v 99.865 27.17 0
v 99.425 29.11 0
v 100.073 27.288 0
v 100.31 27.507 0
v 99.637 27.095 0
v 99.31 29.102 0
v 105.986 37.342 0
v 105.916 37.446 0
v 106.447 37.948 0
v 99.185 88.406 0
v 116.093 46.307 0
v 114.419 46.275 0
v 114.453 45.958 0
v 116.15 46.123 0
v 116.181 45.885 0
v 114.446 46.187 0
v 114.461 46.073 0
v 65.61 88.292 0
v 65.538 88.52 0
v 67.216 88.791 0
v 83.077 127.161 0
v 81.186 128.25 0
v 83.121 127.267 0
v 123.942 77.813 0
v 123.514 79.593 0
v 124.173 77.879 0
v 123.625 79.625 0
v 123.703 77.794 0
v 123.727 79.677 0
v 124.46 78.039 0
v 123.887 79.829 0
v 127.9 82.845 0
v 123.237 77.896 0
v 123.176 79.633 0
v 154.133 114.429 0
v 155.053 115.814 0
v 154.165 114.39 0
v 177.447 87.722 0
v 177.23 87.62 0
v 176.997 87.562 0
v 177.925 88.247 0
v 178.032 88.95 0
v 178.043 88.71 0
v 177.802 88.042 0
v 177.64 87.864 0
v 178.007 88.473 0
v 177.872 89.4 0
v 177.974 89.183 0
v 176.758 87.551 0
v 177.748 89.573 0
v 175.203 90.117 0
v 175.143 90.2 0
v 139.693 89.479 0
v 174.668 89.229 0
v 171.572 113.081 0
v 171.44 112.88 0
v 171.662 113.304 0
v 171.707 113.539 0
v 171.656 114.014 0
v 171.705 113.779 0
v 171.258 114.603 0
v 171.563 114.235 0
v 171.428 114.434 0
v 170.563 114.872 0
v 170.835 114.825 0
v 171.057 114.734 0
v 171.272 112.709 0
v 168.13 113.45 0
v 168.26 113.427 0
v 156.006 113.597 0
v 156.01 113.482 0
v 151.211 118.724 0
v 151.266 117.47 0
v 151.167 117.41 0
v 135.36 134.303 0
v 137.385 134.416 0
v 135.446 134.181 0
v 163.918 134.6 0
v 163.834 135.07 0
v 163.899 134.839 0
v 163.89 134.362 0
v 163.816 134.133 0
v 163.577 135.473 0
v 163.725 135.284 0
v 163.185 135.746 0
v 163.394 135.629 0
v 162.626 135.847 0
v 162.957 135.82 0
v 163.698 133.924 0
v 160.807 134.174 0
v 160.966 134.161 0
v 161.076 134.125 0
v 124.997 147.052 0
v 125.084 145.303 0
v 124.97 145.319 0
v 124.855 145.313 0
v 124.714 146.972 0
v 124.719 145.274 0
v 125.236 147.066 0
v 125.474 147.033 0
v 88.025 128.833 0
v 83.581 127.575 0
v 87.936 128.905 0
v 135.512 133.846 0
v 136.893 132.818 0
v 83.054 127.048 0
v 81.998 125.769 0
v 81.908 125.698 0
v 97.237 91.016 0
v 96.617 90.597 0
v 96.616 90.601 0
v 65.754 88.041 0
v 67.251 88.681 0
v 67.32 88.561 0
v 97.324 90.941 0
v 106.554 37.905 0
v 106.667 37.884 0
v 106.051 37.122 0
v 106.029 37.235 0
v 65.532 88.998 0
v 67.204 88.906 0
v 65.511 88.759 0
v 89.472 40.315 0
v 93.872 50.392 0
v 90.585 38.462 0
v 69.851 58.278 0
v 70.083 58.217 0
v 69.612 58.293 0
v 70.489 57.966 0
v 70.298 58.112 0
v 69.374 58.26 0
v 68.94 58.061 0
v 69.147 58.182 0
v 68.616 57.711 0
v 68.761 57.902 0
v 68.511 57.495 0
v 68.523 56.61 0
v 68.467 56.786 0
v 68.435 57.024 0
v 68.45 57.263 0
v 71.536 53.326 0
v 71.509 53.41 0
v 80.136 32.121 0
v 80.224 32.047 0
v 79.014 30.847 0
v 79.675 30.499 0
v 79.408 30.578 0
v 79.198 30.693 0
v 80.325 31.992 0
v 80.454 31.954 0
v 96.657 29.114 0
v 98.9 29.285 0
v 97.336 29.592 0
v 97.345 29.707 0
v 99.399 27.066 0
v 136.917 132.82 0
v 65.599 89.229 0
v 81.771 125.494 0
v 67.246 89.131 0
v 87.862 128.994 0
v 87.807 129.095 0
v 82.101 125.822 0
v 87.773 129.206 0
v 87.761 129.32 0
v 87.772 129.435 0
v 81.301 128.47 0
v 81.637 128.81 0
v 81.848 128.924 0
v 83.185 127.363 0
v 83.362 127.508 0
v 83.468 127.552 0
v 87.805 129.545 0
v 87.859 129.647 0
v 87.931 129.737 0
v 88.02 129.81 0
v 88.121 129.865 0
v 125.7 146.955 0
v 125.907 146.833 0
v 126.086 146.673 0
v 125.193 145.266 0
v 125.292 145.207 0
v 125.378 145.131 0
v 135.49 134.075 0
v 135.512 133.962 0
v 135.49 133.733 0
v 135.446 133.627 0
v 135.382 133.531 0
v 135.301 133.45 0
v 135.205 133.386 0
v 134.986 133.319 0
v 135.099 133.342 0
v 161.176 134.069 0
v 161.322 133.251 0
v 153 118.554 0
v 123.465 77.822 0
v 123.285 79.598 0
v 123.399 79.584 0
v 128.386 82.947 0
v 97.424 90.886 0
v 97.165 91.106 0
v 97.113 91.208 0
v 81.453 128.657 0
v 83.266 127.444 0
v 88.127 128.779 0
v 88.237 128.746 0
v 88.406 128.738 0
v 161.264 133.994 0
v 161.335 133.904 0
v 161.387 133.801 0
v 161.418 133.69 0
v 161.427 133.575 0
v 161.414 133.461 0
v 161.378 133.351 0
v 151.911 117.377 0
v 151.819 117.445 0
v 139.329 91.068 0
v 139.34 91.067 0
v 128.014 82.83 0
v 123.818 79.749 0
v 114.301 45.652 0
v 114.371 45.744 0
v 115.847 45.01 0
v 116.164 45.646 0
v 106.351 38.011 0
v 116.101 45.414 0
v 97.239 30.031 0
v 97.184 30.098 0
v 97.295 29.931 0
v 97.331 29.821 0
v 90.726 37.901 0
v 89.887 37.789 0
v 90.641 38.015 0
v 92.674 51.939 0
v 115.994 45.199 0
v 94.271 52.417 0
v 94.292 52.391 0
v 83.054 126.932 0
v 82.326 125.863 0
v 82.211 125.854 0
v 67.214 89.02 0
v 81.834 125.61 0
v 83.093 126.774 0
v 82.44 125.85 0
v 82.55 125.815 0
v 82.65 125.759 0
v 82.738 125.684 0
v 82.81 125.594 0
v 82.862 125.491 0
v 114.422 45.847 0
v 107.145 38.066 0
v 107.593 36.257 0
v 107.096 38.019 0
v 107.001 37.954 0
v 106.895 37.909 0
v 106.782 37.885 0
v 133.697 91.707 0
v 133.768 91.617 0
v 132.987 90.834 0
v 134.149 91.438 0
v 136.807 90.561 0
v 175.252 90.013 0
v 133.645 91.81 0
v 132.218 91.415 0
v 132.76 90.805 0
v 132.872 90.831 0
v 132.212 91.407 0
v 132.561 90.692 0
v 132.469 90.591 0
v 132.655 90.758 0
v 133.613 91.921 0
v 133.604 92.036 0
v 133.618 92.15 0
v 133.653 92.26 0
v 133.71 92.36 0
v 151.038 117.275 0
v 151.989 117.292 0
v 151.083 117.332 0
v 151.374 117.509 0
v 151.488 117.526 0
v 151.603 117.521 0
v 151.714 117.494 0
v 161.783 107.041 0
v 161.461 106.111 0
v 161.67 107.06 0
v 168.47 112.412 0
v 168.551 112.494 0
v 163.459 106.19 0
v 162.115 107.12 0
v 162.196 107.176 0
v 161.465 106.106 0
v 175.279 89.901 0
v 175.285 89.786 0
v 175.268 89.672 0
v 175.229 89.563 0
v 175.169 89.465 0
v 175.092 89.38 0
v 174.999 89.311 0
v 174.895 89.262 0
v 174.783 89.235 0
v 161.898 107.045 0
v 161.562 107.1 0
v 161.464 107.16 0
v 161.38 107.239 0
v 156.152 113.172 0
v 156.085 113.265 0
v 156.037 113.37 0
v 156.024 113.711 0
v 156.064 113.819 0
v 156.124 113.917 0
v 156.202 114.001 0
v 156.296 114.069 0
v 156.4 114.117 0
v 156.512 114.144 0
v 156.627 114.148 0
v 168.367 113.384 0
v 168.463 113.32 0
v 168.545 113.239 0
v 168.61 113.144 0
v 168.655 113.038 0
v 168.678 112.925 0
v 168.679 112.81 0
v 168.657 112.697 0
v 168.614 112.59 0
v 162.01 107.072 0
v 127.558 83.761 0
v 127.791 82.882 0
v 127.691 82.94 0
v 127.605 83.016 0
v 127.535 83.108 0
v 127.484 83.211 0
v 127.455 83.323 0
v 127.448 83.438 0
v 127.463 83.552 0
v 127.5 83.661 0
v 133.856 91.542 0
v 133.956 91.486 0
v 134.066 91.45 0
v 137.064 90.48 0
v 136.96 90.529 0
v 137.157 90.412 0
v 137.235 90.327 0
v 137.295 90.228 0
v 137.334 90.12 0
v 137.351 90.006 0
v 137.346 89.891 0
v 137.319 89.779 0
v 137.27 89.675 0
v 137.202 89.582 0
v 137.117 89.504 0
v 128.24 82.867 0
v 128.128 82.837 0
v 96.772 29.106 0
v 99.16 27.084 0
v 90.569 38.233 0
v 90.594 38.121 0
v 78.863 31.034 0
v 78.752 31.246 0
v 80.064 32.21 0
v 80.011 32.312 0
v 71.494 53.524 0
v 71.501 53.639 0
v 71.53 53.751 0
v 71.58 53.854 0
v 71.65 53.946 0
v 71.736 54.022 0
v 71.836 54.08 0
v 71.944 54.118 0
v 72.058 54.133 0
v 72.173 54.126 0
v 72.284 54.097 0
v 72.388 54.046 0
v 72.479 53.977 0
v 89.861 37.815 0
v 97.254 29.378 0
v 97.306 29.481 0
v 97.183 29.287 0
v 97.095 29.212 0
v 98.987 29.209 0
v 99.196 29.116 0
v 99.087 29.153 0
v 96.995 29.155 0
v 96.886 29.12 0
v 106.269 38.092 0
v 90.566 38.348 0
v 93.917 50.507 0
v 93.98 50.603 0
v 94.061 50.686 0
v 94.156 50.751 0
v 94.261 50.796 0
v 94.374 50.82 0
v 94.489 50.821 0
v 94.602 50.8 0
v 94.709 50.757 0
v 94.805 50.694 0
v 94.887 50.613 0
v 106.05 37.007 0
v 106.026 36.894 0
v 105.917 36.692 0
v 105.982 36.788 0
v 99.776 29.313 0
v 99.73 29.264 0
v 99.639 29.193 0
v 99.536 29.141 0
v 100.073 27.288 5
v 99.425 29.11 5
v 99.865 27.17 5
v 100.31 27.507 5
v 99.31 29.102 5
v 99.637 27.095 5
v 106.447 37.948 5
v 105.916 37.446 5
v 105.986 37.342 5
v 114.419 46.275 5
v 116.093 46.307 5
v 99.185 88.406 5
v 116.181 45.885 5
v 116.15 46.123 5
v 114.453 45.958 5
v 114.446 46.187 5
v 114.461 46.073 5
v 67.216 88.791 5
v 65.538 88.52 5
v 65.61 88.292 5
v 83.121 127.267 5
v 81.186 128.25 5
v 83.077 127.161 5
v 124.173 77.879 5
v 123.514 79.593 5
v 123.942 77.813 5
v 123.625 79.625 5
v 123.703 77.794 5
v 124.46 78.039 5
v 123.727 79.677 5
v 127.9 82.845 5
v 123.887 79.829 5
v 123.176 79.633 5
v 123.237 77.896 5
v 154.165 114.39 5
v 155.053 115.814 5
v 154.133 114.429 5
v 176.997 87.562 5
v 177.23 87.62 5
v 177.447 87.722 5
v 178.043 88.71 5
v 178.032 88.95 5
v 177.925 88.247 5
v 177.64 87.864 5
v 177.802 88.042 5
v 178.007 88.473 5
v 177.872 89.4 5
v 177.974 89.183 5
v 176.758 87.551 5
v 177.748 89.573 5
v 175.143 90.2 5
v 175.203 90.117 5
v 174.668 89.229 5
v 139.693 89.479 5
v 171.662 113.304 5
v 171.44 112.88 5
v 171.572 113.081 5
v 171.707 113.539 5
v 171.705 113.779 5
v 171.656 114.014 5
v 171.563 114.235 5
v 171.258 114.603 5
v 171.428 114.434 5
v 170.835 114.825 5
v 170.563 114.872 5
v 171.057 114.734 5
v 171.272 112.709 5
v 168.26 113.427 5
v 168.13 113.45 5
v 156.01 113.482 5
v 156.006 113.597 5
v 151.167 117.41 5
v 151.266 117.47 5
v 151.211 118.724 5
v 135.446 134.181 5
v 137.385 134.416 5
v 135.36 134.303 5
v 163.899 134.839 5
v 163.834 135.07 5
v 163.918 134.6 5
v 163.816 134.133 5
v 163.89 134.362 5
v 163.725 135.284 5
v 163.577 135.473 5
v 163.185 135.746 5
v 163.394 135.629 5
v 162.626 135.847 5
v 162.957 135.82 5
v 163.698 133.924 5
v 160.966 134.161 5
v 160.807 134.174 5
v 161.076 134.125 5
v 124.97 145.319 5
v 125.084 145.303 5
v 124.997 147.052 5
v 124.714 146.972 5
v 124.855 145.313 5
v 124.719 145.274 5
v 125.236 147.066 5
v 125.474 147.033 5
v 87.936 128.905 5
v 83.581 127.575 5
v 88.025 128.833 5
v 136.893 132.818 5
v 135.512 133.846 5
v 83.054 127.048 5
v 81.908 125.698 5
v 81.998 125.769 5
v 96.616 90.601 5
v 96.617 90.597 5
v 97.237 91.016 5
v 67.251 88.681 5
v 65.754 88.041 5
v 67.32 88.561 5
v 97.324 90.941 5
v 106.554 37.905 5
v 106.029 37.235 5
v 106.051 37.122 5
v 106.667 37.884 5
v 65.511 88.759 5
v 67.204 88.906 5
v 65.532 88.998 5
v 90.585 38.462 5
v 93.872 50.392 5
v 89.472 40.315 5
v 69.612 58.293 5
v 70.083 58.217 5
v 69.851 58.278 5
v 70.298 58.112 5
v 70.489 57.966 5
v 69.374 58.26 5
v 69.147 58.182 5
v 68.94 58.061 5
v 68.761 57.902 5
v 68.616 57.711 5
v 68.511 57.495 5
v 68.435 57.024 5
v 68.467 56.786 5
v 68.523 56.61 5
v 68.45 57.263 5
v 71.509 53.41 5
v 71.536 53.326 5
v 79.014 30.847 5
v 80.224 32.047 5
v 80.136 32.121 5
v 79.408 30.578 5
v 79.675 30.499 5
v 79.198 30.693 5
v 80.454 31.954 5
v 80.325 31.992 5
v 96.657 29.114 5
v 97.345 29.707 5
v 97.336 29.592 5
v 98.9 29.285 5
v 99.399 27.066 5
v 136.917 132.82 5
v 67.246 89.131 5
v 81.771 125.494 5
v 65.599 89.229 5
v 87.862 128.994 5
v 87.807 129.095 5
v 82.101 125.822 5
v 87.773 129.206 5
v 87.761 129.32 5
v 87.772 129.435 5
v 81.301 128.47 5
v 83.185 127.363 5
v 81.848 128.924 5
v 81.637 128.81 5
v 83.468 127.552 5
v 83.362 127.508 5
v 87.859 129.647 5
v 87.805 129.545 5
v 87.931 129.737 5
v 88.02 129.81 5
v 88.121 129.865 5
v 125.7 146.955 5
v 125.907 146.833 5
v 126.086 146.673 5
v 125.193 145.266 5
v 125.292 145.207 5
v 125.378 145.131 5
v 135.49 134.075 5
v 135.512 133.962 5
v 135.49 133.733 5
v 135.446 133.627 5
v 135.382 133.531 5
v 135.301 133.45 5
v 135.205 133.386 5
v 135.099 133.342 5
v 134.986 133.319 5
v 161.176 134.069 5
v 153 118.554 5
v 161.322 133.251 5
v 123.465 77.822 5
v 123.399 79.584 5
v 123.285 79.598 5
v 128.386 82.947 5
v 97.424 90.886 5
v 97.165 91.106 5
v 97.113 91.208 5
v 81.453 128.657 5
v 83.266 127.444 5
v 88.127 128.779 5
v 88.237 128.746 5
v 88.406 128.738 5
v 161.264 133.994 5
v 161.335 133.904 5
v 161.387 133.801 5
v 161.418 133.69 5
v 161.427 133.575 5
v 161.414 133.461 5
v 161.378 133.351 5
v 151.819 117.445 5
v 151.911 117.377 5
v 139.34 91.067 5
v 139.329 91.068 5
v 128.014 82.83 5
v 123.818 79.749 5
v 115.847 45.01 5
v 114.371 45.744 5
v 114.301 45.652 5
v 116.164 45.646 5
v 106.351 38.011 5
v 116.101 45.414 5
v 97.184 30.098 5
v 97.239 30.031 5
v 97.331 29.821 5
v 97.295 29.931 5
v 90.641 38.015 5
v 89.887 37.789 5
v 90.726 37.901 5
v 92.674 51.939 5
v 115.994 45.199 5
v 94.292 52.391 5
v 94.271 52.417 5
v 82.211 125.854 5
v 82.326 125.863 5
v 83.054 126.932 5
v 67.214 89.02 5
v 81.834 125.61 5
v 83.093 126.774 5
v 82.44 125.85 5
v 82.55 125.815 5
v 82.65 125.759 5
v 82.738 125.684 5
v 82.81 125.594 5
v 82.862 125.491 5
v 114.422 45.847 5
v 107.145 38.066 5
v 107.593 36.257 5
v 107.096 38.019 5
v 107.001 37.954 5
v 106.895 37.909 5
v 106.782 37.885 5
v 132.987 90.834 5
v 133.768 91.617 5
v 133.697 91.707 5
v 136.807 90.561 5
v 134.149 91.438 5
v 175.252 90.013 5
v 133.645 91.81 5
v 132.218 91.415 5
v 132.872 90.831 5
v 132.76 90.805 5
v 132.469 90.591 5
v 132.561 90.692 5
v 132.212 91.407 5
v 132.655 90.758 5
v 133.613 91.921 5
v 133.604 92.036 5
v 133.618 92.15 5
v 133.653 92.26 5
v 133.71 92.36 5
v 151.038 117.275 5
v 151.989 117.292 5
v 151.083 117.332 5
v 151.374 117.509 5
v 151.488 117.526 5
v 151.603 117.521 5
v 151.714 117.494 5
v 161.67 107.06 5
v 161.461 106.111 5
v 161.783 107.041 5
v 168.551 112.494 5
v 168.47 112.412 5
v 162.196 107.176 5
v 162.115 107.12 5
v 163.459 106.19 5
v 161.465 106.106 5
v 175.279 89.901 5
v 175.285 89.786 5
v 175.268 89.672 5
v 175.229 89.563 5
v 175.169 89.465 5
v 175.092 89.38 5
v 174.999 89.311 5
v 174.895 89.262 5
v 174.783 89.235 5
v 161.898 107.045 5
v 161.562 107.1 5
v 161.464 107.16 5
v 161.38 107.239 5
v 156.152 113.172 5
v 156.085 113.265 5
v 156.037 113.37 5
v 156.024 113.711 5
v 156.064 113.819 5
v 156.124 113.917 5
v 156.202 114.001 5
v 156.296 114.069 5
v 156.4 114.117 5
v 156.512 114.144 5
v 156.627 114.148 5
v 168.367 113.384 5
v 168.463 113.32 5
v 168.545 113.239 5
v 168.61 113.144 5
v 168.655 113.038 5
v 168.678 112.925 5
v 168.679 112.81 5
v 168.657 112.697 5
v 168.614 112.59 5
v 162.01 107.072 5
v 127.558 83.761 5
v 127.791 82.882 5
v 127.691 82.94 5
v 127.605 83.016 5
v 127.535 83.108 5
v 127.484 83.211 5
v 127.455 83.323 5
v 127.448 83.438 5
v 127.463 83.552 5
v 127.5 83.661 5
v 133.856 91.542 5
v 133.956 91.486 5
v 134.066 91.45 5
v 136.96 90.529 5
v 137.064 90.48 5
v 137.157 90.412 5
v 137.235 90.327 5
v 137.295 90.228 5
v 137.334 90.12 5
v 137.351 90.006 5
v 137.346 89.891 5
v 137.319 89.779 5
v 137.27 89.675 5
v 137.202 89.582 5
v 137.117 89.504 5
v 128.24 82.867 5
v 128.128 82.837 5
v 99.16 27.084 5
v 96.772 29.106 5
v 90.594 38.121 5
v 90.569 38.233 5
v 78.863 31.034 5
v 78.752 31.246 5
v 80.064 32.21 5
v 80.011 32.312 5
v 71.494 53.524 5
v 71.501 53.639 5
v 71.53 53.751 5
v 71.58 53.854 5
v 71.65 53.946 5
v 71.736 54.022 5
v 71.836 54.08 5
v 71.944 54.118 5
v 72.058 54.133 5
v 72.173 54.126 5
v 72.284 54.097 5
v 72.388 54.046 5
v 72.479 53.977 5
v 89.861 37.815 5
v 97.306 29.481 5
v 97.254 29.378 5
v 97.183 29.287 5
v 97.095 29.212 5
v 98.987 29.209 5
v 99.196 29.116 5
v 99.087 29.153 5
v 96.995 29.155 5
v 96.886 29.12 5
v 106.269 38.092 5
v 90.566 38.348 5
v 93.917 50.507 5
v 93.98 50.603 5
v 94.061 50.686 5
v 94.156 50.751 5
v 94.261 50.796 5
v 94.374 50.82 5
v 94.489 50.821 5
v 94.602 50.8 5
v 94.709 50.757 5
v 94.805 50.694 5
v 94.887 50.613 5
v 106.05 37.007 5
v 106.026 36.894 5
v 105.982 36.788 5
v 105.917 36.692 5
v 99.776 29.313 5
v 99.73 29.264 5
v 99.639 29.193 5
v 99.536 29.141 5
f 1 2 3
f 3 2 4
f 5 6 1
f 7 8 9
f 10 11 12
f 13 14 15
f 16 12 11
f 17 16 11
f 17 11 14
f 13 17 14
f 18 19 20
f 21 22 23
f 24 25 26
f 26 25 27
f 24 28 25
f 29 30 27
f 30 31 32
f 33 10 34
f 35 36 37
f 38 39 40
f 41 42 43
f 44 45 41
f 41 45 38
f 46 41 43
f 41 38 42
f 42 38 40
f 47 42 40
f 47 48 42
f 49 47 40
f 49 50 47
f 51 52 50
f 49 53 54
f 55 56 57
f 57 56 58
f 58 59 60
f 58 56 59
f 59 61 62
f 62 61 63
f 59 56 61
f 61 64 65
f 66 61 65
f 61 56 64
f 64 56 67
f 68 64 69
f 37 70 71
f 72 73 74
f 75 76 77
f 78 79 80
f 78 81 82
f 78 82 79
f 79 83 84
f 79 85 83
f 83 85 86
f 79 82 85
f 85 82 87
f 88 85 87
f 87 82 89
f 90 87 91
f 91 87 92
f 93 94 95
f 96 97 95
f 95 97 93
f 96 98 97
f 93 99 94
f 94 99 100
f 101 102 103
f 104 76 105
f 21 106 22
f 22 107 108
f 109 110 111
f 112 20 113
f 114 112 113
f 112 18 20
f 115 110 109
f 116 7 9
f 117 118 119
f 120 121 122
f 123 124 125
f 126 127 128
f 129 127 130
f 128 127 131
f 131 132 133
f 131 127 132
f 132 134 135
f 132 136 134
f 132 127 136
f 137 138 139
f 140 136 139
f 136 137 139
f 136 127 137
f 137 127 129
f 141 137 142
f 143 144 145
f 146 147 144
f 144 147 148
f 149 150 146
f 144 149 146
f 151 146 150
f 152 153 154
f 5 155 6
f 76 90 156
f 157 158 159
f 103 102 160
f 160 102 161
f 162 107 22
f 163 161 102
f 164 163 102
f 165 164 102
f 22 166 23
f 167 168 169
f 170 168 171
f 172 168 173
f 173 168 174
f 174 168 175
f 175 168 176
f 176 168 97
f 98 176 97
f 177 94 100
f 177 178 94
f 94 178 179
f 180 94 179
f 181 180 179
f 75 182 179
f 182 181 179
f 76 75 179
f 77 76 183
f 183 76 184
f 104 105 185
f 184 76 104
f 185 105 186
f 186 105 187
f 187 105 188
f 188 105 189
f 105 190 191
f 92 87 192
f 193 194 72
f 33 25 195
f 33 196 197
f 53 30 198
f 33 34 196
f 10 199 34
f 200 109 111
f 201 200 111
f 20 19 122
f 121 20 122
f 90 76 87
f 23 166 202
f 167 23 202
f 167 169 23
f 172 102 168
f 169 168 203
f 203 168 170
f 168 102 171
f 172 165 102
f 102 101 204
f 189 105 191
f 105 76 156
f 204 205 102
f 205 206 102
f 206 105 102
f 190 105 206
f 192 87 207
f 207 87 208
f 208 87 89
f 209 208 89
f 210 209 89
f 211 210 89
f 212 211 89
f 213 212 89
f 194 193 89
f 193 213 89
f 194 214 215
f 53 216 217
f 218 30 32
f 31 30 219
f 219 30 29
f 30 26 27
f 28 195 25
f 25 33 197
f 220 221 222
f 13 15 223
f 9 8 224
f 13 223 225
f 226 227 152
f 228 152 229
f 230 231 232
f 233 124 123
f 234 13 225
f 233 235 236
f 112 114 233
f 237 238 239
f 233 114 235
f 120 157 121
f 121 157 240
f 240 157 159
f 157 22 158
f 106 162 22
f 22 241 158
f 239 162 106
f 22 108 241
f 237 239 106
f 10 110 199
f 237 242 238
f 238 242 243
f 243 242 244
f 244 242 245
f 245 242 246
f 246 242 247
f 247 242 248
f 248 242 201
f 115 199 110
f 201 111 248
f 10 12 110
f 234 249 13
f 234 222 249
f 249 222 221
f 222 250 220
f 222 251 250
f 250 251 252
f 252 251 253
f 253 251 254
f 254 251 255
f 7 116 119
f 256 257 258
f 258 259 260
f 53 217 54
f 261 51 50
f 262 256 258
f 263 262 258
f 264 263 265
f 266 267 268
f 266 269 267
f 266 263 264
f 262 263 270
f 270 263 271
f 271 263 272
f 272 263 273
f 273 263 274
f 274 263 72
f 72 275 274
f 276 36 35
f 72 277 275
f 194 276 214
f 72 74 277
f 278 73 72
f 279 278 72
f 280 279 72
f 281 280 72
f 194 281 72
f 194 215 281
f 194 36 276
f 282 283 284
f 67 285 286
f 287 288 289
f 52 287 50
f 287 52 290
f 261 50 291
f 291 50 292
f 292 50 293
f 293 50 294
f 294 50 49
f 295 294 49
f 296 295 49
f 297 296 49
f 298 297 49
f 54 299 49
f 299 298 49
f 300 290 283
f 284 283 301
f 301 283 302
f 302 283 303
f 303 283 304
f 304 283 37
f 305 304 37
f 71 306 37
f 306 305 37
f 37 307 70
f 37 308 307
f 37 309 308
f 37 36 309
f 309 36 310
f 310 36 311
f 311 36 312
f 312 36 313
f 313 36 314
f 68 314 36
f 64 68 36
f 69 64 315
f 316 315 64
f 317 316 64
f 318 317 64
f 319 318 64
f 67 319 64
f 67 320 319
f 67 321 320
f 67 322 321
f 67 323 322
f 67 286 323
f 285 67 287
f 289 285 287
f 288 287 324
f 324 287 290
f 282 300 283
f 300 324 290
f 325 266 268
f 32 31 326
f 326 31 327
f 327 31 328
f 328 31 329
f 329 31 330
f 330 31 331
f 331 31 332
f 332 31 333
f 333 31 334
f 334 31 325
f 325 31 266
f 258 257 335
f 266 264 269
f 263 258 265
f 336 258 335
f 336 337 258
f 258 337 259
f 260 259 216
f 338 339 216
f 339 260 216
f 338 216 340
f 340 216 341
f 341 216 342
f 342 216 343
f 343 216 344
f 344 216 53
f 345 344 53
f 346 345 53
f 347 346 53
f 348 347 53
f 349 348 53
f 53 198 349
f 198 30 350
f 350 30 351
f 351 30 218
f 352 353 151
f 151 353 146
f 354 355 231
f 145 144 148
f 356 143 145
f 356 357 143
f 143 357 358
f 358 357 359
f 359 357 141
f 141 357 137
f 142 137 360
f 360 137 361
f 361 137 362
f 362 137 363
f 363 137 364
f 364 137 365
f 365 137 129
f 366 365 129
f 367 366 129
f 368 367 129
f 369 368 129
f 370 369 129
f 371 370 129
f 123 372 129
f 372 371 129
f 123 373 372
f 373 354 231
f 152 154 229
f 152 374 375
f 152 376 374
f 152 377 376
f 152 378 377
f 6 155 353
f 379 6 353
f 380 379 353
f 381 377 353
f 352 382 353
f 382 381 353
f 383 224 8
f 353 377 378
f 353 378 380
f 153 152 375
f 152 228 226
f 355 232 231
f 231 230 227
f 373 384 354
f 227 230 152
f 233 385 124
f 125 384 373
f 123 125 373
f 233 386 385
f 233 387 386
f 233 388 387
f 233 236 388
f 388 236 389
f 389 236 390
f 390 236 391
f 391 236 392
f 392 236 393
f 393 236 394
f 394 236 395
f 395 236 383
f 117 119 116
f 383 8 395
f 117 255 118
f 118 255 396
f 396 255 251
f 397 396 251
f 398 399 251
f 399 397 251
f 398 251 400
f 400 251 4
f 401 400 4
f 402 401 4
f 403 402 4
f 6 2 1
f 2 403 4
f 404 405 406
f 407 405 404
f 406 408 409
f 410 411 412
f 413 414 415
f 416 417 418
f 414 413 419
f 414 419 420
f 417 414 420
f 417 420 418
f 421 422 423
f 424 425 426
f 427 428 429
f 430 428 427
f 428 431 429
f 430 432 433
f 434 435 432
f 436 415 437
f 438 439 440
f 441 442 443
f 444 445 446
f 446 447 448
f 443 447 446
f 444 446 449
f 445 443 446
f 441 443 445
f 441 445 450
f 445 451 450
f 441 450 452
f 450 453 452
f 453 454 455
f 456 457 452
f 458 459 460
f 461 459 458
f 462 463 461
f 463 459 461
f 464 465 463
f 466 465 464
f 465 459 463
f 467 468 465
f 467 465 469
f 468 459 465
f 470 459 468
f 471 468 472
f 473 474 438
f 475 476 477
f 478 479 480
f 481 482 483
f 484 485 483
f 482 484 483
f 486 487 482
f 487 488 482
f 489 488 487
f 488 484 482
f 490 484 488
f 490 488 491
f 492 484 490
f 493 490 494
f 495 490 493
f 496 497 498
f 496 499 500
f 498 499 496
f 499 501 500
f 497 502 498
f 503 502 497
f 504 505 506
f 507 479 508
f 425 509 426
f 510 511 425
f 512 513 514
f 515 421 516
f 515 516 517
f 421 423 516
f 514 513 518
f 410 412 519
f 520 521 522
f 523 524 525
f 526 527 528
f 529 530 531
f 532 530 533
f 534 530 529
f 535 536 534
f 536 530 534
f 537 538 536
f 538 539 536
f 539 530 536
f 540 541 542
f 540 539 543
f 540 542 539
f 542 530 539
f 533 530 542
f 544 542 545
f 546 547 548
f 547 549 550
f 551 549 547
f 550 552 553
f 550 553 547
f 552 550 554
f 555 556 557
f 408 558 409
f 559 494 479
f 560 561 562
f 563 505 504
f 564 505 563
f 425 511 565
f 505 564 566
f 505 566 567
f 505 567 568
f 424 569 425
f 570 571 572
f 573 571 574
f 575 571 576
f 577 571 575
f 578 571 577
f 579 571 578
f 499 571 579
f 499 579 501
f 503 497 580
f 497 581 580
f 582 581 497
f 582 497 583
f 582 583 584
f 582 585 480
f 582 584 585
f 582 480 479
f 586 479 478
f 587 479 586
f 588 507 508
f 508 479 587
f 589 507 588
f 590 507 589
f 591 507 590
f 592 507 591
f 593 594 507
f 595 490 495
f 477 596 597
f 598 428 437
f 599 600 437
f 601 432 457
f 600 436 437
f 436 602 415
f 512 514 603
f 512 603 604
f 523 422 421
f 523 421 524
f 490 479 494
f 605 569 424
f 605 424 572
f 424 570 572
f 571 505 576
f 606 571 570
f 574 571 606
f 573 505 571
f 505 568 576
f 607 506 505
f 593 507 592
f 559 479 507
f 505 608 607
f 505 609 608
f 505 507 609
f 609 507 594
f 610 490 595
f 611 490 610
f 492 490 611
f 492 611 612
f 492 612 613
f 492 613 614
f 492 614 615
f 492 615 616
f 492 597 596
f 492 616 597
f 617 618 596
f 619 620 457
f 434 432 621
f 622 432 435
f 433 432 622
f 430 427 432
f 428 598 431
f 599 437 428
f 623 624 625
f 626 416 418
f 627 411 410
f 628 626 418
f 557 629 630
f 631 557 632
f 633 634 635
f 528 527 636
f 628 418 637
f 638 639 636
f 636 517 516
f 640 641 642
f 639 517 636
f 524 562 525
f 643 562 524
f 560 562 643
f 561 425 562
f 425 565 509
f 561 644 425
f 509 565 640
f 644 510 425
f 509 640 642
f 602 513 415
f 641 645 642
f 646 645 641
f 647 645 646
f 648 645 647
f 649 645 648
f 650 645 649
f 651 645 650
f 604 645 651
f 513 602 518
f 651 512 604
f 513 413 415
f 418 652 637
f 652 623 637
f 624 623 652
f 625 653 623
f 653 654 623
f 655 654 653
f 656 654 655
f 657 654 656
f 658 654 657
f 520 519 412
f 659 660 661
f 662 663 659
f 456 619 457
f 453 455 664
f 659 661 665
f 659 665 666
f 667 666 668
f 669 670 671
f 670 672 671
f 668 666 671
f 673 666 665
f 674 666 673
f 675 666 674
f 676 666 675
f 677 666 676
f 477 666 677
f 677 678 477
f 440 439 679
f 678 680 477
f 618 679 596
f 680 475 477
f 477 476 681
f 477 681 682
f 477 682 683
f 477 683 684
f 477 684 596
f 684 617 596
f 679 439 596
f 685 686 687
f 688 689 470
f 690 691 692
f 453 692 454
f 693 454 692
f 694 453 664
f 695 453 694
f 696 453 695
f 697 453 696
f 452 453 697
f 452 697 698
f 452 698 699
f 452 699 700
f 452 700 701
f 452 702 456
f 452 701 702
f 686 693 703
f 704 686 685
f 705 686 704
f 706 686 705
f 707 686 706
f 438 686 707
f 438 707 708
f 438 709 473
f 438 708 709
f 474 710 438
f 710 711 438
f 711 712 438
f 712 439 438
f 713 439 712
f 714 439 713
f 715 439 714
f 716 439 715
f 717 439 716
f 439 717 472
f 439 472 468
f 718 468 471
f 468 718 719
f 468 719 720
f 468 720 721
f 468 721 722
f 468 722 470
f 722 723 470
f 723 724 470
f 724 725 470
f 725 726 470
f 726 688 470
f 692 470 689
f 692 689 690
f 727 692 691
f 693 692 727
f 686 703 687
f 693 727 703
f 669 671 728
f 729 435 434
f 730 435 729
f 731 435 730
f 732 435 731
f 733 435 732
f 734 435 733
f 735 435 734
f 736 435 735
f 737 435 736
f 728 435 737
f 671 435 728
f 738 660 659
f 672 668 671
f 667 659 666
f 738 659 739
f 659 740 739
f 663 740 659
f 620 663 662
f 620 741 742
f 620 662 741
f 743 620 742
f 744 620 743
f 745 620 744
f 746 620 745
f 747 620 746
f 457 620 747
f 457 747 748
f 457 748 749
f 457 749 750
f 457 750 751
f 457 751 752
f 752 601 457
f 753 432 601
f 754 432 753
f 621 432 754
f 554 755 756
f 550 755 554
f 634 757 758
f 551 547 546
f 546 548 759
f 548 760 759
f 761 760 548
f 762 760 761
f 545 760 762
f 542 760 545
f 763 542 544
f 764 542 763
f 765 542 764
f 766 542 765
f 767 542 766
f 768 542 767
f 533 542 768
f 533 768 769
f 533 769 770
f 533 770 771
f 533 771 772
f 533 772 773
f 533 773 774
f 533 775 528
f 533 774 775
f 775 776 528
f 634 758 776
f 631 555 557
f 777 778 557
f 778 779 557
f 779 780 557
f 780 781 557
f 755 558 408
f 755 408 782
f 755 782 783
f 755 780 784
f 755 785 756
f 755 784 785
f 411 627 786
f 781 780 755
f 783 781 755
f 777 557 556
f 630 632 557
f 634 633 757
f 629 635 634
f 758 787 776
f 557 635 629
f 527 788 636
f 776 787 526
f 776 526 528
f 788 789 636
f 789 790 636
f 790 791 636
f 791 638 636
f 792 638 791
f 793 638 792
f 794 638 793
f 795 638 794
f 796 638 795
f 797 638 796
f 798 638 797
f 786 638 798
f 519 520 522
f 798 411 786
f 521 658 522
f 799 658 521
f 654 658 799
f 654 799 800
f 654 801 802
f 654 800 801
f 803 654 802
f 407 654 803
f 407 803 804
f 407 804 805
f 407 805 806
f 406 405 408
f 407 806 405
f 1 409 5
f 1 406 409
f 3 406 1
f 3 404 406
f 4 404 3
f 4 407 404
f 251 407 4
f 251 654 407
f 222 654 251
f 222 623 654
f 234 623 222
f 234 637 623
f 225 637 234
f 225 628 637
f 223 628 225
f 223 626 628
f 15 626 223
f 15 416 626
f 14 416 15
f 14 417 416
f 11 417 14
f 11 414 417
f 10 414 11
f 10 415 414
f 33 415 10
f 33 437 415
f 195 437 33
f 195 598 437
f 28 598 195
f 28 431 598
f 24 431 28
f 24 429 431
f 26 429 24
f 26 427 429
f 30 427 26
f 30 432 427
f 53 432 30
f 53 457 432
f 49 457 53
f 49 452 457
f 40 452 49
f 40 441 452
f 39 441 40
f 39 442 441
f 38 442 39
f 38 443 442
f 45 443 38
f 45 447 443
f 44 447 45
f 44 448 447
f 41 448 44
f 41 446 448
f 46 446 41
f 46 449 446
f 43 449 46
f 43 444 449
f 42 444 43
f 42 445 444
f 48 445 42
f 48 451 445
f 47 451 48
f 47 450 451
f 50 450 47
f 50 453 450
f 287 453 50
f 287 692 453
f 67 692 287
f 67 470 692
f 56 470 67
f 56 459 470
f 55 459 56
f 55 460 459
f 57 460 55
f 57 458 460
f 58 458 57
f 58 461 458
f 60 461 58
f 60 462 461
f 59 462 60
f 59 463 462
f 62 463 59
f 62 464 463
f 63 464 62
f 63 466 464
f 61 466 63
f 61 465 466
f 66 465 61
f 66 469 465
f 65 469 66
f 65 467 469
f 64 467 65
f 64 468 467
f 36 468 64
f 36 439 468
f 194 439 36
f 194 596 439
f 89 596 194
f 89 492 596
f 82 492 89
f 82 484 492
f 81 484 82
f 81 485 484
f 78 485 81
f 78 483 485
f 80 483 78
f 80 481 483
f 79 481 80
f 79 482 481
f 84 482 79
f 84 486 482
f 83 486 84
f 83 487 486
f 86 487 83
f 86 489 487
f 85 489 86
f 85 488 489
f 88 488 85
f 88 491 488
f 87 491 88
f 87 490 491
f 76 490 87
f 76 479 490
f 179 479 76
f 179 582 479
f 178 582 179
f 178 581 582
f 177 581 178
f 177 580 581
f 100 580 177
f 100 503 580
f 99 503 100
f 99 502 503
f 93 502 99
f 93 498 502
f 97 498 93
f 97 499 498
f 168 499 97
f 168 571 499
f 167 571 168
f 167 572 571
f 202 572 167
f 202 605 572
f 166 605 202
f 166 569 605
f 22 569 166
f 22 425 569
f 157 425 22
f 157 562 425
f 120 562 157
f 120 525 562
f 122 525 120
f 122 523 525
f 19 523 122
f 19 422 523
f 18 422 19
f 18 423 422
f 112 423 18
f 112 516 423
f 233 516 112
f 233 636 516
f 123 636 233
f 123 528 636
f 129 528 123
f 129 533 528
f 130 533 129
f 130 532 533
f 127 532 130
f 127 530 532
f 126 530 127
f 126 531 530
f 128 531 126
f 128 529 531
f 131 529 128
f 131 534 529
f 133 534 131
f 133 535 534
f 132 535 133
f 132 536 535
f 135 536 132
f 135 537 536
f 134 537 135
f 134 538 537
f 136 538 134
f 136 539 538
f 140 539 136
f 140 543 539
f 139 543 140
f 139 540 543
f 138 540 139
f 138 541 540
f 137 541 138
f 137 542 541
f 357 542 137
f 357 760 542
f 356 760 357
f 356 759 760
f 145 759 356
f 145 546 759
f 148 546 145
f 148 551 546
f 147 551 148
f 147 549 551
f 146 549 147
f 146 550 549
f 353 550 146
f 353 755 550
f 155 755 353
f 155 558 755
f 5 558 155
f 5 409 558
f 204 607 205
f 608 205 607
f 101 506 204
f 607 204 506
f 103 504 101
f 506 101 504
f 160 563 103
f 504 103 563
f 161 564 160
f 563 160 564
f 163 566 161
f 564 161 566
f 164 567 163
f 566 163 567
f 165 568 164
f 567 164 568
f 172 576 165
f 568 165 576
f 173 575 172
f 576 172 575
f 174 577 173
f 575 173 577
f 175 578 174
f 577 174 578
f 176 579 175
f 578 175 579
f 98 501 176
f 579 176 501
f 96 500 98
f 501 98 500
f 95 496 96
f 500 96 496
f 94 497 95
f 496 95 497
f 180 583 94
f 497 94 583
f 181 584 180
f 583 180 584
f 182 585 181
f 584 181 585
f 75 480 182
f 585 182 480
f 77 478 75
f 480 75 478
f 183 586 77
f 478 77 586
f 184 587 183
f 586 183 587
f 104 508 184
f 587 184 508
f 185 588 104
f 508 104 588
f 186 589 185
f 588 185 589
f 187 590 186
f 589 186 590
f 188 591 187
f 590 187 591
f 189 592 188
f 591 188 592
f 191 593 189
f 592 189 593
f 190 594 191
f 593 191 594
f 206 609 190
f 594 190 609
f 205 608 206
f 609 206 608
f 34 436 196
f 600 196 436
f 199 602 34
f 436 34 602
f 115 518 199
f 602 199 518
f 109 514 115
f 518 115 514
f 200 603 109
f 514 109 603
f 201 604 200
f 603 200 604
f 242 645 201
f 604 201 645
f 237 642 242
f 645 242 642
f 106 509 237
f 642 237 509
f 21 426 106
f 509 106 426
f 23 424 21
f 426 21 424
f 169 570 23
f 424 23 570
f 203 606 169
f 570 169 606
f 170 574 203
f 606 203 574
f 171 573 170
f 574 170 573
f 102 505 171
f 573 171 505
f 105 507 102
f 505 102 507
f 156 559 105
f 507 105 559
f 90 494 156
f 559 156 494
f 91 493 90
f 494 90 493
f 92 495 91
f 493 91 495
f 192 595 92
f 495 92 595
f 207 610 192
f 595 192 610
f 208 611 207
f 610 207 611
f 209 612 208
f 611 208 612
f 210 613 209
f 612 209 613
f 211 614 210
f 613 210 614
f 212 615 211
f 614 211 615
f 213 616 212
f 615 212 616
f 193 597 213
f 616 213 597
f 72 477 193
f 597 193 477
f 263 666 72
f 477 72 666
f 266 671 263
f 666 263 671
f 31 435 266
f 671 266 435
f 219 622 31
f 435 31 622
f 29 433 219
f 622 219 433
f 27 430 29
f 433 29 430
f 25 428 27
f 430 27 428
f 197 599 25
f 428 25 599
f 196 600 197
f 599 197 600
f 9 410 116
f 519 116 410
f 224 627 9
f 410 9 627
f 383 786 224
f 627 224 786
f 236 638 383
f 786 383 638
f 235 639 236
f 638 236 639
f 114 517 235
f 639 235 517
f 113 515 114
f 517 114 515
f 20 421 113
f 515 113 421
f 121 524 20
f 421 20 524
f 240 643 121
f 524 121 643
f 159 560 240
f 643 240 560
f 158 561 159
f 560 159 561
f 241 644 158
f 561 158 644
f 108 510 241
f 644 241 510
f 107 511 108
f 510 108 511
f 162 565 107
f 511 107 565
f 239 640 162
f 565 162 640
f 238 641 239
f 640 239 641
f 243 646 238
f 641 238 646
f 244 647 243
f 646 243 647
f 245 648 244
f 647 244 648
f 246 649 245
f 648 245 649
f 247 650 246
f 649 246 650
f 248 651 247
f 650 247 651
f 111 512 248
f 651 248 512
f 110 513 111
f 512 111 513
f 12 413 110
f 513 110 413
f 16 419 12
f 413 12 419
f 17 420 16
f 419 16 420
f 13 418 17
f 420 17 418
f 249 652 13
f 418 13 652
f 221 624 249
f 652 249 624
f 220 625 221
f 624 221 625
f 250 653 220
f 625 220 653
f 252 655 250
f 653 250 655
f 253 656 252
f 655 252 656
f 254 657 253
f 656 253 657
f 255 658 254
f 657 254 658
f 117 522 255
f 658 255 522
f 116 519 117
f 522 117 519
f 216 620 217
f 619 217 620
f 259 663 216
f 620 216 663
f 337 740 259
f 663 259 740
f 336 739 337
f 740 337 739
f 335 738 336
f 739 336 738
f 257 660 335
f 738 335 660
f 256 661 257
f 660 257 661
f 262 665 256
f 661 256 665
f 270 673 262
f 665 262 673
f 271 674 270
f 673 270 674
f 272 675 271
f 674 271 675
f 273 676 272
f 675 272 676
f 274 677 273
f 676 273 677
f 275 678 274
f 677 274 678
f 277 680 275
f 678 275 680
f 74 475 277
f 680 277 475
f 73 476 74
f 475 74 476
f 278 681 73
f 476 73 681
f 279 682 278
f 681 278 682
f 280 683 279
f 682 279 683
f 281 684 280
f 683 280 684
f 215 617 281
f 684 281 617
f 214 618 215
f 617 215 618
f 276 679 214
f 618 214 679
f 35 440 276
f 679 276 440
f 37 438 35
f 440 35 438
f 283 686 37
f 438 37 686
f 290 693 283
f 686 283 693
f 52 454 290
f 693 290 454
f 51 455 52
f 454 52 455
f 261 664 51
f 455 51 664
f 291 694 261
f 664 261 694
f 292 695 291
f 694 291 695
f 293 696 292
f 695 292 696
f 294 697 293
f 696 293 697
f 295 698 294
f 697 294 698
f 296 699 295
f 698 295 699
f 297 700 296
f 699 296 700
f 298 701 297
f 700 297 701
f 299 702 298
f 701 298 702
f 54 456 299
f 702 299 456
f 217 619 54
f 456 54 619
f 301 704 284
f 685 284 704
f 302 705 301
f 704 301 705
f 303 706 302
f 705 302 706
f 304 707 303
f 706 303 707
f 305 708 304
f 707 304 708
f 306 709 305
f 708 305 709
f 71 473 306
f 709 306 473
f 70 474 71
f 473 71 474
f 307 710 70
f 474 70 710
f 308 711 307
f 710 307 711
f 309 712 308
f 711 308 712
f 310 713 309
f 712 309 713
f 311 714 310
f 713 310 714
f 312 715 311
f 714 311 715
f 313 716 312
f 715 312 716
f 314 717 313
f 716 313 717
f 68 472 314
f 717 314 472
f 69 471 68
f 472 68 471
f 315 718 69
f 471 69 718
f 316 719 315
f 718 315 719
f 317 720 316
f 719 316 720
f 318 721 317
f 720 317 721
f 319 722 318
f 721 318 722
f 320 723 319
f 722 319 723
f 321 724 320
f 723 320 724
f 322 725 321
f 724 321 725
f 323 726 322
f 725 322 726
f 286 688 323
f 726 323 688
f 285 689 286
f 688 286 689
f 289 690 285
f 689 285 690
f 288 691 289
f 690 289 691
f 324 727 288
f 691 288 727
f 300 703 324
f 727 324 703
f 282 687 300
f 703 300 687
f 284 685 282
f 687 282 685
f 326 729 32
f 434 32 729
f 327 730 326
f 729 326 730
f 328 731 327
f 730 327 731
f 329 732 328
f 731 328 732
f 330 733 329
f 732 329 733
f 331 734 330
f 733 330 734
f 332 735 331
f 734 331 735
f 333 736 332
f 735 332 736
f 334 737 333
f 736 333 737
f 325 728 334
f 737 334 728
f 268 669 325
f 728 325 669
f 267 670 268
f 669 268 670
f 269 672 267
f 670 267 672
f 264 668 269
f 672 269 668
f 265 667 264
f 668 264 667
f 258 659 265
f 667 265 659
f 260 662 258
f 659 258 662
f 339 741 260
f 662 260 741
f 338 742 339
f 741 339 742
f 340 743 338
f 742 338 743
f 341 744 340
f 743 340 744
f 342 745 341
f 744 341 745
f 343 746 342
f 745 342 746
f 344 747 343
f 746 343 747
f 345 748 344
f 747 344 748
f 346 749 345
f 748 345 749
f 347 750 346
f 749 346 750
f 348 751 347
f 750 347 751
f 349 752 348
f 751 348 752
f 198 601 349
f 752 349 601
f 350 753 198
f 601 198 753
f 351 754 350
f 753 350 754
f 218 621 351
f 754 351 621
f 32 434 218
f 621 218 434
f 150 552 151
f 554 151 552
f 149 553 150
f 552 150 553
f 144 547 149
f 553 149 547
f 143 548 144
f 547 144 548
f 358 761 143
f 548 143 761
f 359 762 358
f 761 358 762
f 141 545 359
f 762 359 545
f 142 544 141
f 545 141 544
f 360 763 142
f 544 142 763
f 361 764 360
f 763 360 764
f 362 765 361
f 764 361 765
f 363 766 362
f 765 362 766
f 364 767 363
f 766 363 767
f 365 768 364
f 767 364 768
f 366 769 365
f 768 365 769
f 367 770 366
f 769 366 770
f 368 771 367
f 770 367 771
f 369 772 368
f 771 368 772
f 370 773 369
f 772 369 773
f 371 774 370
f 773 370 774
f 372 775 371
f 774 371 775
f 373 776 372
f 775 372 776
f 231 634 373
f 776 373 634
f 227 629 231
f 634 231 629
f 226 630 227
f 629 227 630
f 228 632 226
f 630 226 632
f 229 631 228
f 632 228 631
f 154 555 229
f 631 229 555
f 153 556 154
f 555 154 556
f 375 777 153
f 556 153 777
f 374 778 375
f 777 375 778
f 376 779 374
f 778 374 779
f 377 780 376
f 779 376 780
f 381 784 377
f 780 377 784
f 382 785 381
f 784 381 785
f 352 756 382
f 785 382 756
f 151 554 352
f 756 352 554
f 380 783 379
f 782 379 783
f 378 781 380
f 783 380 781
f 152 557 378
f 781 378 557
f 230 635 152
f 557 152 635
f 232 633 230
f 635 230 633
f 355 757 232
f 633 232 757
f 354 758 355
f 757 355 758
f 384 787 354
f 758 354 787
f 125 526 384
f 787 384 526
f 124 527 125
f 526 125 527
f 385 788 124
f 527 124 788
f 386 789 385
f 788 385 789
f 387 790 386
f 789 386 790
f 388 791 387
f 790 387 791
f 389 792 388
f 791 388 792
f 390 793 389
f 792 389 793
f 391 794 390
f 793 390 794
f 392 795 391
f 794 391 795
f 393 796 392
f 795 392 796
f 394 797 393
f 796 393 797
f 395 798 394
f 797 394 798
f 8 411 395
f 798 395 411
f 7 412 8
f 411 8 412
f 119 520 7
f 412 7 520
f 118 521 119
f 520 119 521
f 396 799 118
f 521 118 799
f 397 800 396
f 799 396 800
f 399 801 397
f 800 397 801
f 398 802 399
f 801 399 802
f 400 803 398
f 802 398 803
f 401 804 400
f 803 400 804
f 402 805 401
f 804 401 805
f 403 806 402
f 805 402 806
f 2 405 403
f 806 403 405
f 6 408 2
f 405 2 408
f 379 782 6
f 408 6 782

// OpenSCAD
/*
 * Customizable Origami - Swan - https://www.thingiverse.com/thing:2627896
 * by Dennis Hofmann - https://www.thingiverse.com/mightynozzle/about
 * created 2017-11-06
 * version v1.0
 *
 * Changelog
 * --------------
 * v1.0:
 *      - final design
 * --------------
 * 
 * This work is licensed under the Creative Commons - Attribution - NonCommercial - ShareAlike license.
 * https://creativecommons.org/licenses/by-nc-sa/3.0/
 */


 // Parameter Section //
//-------------------//

// preview[view:north, tilt:top]

// The maximum size of the longest side. The shorter side will be automatically resized in same ratio.
max_size_in_millimeter = 120; //[20:300]

// The height of the model.
model_height_in_millimeter = 5; //[0.2:0.2:100]

// Thickness of the outer outline.
outline_size_in_millimeter = 1.6; //[0.5:0.1:20]

// Thickness of the inner outline.
inline_size_in_millimeter = 0.7; //[0.5:0.1:20]

// Roundiness of the ends of the inner outlines.
inline_edge_radius_in_millimeter = 0.6; //[0.0:0.1:5]

// Flip model
flip_model = "no"; //[yes,no]

/*[hidden]*/
max_size = max_size_in_millimeter;
model_height = model_height_in_millimeter;
$fn=32;

// Outer Points
A1 = [143, 117];
A2 = [164, 65];
A3 = [204, 58];
A4 = [219, 76];
A5 = [236, 94];
A6 = [199, 186];
A7 = [254, 162];
A8 = [286, 186];
A9 = [363, 182];
A10 = [332, 218];
A11 = [350, 233];
A12 = [317, 235];
A13 = [311, 243];
A14 = [334, 276];
A15 = [281, 273];
A16 = [257, 299];
A17 = [169, 262];
A18 = [137, 182];
A19 = [193, 107];
A20 = [185, 78];

outline = [A1, A2, A3, A4, A5, A6, A7, A8, A9, A10, A11, A12, A13, A14, A15, A16, A17, A18, A19, A20];

// Inner Points
B1 = [272, 187];

// Polygons
C1 = [A1, A2, A3, A20];
C2 = [A20, A3, A4, A19];
C3 = [A5, A6, A17, A18, A19, A4];
C4 = [A6, A17, A15, A14, A13, B1, A7];
C5 = [A7, B1, A8];
C6 = [B1, A8, A9, A10, A12, A13];
C7 = [A10, A11, A12];
C8 = [A15, A16, A17];

cut_polygons = [C1, C2, C3, C4, C5, C6, C7, C8];

min_x = A18[0];
min_y = A3[1];
max_x = A9[0];
max_y = A16[1];

x_size = max_x - min_x;
y_size = max_y - min_y;

x_factor = max_size / x_size;
y_factor = max_size / y_size;

inline_size = x_size > y_size ? inline_size_in_millimeter / x_factor / 2: inline_size_in_millimeter / y_factor / 2;
inline_edge_radius = x_size > y_size ? inline_edge_radius_in_millimeter / x_factor: inline_edge_radius_in_millimeter / y_factor;
outline_size = x_size > y_size ? outline_size_in_millimeter / x_factor - inline_size: outline_size_in_millimeter / y_factor - inline_size;


 // Program Section //
//-----------------//

if(x_size > y_size) {
    resize(newsize=[max_size, x_factor * y_size, model_height]){
        if(flip_model == "yes") {
            mirror([0,1,0]) {
                rotate([180,180,0]) {    
                    create(outline, cut_polygons);
                }
            }
        } else {
            create(outline, cut_polygons);
        }
    }
} else {
    resize(newsize=[y_factor * x_size, max_size, model_height]){
        if(flip_model == "yes") {
            mirror([0,1,0]) {
                rotate([180,180,0]) {    
                    create(outline, cut_polygons);
                }
            }
        } else {
            create(outline, cut_polygons);
        }
    }
}


 // Module Section //
//----------------//

module create() {
    linear_extrude(height=1) {
        difference() {
            offset(r = -0) {
                offset(r = +outline_size) {
                    polygon(points = outline, convexity = 10);
                }
            }
            
            for(cut_polygon = [0:len(cut_polygons)]) {
                offset(r = +inline_edge_radius) {
                    offset(r = -inline_size - inline_edge_radius) {
                        polygon(points = cut_polygons[cut_polygon], convexity = 10);
                    }
                }
            }
        }
    }
}
